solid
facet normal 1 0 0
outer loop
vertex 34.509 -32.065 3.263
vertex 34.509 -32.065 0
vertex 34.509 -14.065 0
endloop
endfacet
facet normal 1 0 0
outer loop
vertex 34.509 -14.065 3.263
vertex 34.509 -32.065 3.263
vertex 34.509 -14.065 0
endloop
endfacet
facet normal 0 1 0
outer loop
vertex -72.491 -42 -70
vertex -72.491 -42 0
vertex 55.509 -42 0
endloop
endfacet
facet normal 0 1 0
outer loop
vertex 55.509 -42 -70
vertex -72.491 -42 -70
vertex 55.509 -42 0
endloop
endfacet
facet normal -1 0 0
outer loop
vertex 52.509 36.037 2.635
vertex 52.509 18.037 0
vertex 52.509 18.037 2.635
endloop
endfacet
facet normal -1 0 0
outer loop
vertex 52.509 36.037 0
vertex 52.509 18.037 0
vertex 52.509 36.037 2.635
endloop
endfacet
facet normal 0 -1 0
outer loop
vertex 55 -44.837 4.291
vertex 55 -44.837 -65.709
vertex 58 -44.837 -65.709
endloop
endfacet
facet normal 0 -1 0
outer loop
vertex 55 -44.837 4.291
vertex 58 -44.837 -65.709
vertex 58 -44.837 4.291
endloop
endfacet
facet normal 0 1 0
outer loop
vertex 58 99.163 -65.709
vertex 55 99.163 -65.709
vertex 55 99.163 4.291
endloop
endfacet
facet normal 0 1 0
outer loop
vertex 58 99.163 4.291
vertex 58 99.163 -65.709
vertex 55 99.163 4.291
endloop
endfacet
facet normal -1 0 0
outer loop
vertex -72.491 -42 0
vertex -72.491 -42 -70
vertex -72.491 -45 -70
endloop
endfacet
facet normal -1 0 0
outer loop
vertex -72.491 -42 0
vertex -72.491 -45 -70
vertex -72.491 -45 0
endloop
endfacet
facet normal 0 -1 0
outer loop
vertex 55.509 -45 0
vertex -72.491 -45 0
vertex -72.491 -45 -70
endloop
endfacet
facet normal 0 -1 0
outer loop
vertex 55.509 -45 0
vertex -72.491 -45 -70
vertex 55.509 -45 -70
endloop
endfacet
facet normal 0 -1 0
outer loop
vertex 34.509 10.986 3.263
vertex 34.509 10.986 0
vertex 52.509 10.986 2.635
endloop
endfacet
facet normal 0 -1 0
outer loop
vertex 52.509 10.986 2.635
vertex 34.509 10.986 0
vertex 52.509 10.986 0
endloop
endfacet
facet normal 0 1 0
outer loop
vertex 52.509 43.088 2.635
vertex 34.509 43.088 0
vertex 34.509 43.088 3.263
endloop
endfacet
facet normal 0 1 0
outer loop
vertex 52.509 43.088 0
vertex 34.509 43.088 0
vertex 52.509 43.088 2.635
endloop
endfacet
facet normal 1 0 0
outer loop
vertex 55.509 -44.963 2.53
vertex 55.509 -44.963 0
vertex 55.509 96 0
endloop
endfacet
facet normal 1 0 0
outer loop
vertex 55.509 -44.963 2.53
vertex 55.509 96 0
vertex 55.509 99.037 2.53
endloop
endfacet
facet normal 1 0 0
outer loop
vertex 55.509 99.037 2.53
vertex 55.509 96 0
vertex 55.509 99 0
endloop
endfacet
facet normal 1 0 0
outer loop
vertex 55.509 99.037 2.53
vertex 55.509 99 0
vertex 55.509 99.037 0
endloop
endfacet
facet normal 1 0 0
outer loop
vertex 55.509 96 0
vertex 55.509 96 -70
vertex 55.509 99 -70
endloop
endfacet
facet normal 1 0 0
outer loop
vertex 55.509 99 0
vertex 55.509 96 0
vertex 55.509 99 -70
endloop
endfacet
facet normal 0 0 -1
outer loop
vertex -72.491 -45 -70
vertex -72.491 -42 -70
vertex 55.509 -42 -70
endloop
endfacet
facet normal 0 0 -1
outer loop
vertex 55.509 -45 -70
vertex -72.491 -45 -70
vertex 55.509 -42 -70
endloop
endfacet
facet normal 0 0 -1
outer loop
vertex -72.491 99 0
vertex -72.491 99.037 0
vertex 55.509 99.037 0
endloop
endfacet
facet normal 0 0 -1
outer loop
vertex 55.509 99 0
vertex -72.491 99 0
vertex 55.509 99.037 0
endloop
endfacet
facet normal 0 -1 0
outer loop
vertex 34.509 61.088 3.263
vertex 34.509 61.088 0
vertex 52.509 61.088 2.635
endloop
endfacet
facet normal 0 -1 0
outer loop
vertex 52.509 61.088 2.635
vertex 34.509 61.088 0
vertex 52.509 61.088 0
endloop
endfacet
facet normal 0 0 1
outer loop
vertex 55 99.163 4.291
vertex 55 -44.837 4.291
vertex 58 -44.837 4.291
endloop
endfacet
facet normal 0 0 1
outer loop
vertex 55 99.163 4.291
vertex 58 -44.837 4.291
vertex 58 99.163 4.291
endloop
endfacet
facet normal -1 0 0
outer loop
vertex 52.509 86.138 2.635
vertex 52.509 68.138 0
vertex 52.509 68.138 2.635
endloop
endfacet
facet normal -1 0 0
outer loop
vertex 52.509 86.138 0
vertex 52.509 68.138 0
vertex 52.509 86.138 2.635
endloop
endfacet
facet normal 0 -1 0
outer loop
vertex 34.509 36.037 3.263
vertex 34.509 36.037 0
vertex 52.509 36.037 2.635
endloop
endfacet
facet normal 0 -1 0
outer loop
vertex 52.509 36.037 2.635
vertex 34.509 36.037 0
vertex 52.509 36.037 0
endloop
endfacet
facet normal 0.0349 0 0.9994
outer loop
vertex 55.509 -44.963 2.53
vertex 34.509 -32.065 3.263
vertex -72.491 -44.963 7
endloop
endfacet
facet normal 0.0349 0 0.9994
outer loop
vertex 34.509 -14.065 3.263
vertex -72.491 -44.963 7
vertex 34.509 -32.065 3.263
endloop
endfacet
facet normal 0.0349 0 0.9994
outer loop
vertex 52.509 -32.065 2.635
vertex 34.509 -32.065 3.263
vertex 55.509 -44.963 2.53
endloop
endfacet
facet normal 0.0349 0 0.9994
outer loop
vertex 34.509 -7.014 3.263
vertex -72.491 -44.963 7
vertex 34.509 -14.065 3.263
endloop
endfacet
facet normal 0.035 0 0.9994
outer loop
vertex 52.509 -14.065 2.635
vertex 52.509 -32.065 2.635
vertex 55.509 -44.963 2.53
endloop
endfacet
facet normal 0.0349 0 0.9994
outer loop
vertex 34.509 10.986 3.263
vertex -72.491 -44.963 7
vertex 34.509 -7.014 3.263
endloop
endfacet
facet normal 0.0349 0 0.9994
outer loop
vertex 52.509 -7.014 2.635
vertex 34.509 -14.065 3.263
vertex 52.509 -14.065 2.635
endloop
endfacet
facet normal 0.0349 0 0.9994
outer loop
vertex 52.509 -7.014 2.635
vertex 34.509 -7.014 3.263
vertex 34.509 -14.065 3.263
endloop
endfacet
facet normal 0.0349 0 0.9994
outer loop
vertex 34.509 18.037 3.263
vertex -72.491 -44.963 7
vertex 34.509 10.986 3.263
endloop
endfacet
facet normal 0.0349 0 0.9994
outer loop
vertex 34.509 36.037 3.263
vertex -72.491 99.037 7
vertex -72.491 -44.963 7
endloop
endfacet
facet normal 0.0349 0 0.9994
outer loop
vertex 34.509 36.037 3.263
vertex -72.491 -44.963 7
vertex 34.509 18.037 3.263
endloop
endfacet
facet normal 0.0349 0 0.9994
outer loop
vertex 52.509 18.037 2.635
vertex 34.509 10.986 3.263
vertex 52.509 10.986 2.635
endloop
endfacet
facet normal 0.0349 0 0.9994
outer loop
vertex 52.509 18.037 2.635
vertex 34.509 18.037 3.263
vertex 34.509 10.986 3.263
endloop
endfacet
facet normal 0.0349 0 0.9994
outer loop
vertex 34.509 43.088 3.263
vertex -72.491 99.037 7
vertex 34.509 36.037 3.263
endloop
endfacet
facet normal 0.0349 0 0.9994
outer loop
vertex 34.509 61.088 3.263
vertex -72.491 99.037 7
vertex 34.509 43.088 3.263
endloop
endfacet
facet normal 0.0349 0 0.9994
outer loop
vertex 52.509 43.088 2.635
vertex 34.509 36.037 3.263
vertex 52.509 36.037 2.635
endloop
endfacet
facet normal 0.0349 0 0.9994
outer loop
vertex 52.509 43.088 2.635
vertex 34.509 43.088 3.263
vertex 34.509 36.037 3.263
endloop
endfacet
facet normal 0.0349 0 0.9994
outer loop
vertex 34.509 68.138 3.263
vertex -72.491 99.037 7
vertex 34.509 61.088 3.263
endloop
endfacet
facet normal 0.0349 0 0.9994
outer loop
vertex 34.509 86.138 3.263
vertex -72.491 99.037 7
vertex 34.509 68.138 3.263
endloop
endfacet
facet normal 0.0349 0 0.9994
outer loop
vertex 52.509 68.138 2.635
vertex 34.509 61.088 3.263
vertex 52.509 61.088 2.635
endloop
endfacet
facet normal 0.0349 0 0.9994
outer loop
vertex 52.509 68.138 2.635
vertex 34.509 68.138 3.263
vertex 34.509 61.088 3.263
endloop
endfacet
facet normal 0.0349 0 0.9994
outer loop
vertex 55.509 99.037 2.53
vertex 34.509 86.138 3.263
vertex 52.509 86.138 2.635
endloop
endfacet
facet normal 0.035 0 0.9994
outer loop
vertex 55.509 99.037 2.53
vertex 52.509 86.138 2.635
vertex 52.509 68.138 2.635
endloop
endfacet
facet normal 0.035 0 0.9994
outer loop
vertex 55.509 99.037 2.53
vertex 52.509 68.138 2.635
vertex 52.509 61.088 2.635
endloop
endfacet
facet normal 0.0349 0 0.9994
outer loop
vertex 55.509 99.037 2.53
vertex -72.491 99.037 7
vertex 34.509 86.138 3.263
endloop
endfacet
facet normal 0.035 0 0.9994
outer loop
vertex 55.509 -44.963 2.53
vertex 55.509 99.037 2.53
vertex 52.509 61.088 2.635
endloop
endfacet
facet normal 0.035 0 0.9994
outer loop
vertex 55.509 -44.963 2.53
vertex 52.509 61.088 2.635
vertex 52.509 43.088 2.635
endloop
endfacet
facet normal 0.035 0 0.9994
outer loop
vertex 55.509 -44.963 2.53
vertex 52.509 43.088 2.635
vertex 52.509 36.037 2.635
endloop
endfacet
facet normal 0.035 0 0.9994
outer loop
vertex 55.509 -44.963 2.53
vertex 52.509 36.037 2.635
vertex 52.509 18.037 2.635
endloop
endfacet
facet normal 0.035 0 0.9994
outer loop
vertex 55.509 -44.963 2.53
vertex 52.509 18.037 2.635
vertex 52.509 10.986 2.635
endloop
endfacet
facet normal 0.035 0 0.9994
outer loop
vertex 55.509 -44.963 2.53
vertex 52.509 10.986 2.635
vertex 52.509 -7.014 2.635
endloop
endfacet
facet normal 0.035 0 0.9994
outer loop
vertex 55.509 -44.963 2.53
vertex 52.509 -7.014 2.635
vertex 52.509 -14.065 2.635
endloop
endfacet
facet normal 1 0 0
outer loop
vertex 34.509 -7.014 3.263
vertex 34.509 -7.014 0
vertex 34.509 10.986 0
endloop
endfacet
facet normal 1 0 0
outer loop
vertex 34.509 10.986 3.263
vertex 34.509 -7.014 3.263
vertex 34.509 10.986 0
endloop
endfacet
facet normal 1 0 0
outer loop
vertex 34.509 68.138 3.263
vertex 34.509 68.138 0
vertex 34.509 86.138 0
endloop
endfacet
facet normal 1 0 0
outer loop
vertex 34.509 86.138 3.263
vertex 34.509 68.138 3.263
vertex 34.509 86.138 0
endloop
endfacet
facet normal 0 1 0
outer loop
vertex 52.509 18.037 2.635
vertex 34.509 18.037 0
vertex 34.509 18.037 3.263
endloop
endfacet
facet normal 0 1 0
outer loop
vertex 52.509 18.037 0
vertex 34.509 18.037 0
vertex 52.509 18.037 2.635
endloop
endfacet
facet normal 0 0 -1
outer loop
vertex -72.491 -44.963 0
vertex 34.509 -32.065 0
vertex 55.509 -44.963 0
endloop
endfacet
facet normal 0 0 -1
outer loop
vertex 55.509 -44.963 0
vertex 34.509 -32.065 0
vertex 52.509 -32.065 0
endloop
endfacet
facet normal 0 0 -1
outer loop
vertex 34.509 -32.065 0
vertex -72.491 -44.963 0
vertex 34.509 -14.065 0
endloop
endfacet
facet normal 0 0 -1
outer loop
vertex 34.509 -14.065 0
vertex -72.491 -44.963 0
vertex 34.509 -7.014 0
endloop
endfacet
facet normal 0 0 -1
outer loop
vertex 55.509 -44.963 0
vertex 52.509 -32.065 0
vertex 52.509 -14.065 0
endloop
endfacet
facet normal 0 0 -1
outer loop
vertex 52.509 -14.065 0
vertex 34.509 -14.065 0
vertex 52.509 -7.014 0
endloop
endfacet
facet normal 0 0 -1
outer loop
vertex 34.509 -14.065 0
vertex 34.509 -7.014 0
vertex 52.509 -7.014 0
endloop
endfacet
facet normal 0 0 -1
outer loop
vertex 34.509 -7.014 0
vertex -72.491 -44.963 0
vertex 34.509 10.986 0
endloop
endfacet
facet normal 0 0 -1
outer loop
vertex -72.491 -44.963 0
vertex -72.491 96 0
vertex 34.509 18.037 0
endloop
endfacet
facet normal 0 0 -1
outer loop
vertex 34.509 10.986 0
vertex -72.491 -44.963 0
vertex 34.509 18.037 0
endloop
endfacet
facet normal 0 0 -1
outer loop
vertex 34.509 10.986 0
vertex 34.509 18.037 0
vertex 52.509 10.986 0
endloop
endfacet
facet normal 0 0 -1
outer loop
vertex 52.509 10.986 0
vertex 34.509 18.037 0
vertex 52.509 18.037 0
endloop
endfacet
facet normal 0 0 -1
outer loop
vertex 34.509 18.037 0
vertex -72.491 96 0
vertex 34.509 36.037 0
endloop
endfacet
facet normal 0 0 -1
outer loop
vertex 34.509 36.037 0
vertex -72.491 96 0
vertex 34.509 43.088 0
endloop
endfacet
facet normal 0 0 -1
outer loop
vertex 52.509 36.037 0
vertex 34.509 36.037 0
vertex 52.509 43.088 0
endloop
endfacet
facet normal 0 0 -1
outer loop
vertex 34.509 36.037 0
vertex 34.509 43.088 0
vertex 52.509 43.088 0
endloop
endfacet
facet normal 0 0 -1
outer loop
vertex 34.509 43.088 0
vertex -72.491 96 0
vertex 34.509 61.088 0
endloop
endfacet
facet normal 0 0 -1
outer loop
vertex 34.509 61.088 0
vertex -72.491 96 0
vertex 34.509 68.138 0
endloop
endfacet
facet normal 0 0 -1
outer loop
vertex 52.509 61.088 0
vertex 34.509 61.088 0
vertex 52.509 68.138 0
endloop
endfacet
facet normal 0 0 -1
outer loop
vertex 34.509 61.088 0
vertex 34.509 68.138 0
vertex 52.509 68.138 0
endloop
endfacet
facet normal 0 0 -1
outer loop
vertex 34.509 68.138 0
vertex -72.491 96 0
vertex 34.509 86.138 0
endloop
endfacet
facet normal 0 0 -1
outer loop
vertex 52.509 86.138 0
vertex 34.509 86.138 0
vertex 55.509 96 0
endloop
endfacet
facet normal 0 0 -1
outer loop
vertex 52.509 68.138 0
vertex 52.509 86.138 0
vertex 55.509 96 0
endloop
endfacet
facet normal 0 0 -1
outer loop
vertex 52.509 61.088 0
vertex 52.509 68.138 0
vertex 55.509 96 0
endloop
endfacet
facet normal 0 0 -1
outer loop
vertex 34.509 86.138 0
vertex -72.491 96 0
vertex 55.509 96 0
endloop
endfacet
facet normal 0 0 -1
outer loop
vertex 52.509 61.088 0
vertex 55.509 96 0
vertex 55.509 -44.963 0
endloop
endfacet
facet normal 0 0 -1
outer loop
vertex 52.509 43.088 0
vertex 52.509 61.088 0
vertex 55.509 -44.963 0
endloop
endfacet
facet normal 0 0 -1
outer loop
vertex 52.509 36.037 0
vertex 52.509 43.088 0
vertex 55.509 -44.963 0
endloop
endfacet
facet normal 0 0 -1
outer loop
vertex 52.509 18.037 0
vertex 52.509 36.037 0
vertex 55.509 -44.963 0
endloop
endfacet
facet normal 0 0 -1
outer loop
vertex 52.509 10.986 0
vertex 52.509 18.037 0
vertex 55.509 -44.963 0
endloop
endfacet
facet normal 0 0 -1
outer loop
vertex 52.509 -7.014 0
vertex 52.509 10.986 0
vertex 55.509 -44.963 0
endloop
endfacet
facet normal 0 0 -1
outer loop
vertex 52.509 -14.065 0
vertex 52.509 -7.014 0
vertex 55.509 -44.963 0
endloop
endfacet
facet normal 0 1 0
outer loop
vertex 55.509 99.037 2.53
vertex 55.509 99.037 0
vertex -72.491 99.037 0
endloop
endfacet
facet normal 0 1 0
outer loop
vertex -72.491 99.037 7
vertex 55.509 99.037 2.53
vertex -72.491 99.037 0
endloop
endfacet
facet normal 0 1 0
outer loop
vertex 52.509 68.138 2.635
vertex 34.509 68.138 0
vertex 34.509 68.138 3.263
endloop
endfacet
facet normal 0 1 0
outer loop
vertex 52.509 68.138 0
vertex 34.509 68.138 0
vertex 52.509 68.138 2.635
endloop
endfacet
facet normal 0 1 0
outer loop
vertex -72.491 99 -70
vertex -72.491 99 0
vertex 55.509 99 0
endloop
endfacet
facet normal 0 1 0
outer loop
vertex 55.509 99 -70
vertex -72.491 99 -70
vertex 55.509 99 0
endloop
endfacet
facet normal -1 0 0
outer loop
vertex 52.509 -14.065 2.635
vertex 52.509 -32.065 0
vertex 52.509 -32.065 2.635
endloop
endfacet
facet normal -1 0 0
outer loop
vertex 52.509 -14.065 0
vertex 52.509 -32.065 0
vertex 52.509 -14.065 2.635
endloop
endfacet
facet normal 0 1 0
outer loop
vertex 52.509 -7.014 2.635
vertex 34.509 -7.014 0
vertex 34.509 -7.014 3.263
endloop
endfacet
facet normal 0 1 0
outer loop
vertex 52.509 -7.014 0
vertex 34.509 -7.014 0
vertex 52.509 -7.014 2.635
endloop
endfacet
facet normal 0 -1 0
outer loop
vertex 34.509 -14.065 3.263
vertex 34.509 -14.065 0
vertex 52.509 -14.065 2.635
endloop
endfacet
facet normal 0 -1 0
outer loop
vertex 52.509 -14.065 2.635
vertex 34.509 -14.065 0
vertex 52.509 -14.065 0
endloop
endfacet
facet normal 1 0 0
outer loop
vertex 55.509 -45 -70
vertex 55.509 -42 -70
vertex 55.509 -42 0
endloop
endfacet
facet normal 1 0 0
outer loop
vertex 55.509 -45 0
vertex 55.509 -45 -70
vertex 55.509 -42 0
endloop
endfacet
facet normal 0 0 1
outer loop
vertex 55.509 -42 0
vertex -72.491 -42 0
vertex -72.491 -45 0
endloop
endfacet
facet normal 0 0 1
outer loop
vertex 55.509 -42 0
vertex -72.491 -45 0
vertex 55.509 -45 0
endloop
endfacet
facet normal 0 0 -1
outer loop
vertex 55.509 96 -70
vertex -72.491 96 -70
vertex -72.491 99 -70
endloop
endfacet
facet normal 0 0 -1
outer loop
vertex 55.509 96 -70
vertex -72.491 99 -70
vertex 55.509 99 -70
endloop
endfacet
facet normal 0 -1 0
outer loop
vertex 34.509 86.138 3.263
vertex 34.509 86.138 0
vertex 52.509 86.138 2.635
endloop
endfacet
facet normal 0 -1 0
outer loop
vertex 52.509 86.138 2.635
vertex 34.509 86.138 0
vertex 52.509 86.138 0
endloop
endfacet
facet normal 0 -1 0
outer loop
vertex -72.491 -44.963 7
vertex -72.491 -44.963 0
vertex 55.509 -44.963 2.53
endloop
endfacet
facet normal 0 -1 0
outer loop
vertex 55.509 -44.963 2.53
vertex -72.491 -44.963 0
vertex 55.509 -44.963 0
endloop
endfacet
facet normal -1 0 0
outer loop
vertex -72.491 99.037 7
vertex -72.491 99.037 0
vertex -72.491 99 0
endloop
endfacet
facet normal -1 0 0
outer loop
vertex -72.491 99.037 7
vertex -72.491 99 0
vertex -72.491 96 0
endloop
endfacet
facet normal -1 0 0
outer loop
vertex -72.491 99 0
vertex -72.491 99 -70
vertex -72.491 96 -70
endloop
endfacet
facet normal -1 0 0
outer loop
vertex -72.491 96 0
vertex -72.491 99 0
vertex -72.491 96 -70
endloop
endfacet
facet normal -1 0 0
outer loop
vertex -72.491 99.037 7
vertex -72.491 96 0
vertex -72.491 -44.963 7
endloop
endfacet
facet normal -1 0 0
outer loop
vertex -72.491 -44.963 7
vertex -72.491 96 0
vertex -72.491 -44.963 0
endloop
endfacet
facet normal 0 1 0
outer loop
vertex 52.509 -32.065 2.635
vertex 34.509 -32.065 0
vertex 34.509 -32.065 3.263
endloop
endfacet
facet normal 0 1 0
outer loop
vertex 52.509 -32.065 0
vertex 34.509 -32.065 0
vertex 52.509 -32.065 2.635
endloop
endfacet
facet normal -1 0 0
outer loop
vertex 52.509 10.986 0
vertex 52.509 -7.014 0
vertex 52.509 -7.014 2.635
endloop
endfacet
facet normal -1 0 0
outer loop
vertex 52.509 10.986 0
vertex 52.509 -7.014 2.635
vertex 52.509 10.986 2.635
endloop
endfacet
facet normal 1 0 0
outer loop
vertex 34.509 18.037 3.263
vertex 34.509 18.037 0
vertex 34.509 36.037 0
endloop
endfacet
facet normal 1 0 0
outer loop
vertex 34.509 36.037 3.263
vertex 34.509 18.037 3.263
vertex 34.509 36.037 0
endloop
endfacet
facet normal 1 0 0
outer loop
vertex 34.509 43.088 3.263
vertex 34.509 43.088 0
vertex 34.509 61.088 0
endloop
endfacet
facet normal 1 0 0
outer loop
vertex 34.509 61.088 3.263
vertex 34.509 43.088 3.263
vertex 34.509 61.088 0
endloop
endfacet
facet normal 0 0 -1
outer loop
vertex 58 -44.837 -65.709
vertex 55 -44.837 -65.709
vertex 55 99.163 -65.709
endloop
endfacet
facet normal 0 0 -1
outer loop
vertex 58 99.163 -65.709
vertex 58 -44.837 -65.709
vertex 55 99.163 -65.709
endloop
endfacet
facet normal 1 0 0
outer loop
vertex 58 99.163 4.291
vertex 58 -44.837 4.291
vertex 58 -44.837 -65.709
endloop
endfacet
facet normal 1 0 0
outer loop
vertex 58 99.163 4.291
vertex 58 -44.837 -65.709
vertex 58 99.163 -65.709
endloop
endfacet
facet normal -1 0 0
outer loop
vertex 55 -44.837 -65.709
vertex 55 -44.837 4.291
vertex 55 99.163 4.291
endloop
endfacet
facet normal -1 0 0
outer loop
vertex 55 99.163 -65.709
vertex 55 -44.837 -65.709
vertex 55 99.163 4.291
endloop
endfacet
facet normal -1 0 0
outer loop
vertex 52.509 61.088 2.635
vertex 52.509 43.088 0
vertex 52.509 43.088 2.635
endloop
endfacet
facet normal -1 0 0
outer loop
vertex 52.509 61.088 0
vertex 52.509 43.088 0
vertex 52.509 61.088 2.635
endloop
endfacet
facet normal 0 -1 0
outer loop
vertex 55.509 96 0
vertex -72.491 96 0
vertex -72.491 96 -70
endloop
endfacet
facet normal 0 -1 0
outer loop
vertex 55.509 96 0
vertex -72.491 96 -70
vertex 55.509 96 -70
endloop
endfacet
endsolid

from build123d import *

# Parameters (mm, degrees)
F0_W        = 18
F0_H        = 18
F3_DEPTH    = 7
F4_T1_DEPTH = 809.5850048039
F5_START    = 42
F1_W        = 128
F1_H        = 70
F5_DEPTH    = 3
F6_START    = -96
F6_DEPTH    = 3
F7_START    = 55
F2_W        = 144
F2_H        = 70
F7_DEPTH    = 3


# Not quite as in the source:
# - a fillet or chamfer that OpenCascade refuses, or shapes differently, is made with other operations: its cross-section is extruded or revolved along the edge and cut away or added


with BuildPart() as f3:
    # F0 (on Top) → F3 (new body)
    with BuildSketch(Plane.XY):
        Polygon((52.5088317096, 99.0367529392), (-72.4911682904, 99.0367529392), (-72.4911682904, -44.9632470608), (52.5088317096, -44.9632470608), (55.5088317096, -44.9632470608), (55.5088317096, 99.0367529392), align=None)
        with Locations((43.5088317096, -23.0649668574)):
            Rectangle(F0_W, F0_H, mode=Mode.SUBTRACT)
        with Locations((43.5088317096, 1.9858930409)):
            Rectangle(F0_W, F0_H, mode=Mode.SUBTRACT)
        with Locations((43.5088317096, 27.0367529392)):
            Rectangle(F0_W, F0_H, mode=Mode.SUBTRACT)
        with Locations((43.5088317096, 52.0876128376)):
            Rectangle(F0_W, F0_H, mode=Mode.SUBTRACT)
        with Locations((43.5088317096, 77.1384727359)):
            Rectangle(F0_W, F0_H, mode=Mode.SUBTRACT)
    extrude(amount=F3_DEPTH)

    # F4: chamfer of 128 x 4.4698584949 on 1 edges, made by hand

    # F4_s2 → F4_t1 (cut)
    with BuildSketch(Plane.XZ.offset(-431.8292553412)):
        Polygon((-72.4911682904, 7), (55.5088317096, 2.5301415051), (55.5088317096, 7), align=None)
    extrude(amount=F4_T1_DEPTH, mode=Mode.SUBTRACT)

    # F1 (on Front) → F6 (join)
    with BuildSketch(Plane.XZ.offset(F6_START)):
        with Locations((-8.4911682904, -35)):
            Rectangle(F1_W, F1_H)
    extrude(amount=-F6_DEPTH)


with BuildPart() as f5:
    # F1 (on Front) → F5 (new body)
    with BuildSketch(Plane.XZ.offset(F5_START)):
        with Locations((-8.4911682904, -35)):
            Rectangle(F1_W, F1_H)
    extrude(amount=F5_DEPTH)


with BuildPart() as f7:
    # F2 (on Right) → F7 (new body)
    with BuildSketch(Plane.YZ.offset(F7_START)):
        with Locations((27.1626058966, -30.7089579414)):
            Rectangle(F2_W, F2_H)
    extrude(amount=F7_DEPTH)


solid = Compound([f3.part, f5.part, f7.part])
